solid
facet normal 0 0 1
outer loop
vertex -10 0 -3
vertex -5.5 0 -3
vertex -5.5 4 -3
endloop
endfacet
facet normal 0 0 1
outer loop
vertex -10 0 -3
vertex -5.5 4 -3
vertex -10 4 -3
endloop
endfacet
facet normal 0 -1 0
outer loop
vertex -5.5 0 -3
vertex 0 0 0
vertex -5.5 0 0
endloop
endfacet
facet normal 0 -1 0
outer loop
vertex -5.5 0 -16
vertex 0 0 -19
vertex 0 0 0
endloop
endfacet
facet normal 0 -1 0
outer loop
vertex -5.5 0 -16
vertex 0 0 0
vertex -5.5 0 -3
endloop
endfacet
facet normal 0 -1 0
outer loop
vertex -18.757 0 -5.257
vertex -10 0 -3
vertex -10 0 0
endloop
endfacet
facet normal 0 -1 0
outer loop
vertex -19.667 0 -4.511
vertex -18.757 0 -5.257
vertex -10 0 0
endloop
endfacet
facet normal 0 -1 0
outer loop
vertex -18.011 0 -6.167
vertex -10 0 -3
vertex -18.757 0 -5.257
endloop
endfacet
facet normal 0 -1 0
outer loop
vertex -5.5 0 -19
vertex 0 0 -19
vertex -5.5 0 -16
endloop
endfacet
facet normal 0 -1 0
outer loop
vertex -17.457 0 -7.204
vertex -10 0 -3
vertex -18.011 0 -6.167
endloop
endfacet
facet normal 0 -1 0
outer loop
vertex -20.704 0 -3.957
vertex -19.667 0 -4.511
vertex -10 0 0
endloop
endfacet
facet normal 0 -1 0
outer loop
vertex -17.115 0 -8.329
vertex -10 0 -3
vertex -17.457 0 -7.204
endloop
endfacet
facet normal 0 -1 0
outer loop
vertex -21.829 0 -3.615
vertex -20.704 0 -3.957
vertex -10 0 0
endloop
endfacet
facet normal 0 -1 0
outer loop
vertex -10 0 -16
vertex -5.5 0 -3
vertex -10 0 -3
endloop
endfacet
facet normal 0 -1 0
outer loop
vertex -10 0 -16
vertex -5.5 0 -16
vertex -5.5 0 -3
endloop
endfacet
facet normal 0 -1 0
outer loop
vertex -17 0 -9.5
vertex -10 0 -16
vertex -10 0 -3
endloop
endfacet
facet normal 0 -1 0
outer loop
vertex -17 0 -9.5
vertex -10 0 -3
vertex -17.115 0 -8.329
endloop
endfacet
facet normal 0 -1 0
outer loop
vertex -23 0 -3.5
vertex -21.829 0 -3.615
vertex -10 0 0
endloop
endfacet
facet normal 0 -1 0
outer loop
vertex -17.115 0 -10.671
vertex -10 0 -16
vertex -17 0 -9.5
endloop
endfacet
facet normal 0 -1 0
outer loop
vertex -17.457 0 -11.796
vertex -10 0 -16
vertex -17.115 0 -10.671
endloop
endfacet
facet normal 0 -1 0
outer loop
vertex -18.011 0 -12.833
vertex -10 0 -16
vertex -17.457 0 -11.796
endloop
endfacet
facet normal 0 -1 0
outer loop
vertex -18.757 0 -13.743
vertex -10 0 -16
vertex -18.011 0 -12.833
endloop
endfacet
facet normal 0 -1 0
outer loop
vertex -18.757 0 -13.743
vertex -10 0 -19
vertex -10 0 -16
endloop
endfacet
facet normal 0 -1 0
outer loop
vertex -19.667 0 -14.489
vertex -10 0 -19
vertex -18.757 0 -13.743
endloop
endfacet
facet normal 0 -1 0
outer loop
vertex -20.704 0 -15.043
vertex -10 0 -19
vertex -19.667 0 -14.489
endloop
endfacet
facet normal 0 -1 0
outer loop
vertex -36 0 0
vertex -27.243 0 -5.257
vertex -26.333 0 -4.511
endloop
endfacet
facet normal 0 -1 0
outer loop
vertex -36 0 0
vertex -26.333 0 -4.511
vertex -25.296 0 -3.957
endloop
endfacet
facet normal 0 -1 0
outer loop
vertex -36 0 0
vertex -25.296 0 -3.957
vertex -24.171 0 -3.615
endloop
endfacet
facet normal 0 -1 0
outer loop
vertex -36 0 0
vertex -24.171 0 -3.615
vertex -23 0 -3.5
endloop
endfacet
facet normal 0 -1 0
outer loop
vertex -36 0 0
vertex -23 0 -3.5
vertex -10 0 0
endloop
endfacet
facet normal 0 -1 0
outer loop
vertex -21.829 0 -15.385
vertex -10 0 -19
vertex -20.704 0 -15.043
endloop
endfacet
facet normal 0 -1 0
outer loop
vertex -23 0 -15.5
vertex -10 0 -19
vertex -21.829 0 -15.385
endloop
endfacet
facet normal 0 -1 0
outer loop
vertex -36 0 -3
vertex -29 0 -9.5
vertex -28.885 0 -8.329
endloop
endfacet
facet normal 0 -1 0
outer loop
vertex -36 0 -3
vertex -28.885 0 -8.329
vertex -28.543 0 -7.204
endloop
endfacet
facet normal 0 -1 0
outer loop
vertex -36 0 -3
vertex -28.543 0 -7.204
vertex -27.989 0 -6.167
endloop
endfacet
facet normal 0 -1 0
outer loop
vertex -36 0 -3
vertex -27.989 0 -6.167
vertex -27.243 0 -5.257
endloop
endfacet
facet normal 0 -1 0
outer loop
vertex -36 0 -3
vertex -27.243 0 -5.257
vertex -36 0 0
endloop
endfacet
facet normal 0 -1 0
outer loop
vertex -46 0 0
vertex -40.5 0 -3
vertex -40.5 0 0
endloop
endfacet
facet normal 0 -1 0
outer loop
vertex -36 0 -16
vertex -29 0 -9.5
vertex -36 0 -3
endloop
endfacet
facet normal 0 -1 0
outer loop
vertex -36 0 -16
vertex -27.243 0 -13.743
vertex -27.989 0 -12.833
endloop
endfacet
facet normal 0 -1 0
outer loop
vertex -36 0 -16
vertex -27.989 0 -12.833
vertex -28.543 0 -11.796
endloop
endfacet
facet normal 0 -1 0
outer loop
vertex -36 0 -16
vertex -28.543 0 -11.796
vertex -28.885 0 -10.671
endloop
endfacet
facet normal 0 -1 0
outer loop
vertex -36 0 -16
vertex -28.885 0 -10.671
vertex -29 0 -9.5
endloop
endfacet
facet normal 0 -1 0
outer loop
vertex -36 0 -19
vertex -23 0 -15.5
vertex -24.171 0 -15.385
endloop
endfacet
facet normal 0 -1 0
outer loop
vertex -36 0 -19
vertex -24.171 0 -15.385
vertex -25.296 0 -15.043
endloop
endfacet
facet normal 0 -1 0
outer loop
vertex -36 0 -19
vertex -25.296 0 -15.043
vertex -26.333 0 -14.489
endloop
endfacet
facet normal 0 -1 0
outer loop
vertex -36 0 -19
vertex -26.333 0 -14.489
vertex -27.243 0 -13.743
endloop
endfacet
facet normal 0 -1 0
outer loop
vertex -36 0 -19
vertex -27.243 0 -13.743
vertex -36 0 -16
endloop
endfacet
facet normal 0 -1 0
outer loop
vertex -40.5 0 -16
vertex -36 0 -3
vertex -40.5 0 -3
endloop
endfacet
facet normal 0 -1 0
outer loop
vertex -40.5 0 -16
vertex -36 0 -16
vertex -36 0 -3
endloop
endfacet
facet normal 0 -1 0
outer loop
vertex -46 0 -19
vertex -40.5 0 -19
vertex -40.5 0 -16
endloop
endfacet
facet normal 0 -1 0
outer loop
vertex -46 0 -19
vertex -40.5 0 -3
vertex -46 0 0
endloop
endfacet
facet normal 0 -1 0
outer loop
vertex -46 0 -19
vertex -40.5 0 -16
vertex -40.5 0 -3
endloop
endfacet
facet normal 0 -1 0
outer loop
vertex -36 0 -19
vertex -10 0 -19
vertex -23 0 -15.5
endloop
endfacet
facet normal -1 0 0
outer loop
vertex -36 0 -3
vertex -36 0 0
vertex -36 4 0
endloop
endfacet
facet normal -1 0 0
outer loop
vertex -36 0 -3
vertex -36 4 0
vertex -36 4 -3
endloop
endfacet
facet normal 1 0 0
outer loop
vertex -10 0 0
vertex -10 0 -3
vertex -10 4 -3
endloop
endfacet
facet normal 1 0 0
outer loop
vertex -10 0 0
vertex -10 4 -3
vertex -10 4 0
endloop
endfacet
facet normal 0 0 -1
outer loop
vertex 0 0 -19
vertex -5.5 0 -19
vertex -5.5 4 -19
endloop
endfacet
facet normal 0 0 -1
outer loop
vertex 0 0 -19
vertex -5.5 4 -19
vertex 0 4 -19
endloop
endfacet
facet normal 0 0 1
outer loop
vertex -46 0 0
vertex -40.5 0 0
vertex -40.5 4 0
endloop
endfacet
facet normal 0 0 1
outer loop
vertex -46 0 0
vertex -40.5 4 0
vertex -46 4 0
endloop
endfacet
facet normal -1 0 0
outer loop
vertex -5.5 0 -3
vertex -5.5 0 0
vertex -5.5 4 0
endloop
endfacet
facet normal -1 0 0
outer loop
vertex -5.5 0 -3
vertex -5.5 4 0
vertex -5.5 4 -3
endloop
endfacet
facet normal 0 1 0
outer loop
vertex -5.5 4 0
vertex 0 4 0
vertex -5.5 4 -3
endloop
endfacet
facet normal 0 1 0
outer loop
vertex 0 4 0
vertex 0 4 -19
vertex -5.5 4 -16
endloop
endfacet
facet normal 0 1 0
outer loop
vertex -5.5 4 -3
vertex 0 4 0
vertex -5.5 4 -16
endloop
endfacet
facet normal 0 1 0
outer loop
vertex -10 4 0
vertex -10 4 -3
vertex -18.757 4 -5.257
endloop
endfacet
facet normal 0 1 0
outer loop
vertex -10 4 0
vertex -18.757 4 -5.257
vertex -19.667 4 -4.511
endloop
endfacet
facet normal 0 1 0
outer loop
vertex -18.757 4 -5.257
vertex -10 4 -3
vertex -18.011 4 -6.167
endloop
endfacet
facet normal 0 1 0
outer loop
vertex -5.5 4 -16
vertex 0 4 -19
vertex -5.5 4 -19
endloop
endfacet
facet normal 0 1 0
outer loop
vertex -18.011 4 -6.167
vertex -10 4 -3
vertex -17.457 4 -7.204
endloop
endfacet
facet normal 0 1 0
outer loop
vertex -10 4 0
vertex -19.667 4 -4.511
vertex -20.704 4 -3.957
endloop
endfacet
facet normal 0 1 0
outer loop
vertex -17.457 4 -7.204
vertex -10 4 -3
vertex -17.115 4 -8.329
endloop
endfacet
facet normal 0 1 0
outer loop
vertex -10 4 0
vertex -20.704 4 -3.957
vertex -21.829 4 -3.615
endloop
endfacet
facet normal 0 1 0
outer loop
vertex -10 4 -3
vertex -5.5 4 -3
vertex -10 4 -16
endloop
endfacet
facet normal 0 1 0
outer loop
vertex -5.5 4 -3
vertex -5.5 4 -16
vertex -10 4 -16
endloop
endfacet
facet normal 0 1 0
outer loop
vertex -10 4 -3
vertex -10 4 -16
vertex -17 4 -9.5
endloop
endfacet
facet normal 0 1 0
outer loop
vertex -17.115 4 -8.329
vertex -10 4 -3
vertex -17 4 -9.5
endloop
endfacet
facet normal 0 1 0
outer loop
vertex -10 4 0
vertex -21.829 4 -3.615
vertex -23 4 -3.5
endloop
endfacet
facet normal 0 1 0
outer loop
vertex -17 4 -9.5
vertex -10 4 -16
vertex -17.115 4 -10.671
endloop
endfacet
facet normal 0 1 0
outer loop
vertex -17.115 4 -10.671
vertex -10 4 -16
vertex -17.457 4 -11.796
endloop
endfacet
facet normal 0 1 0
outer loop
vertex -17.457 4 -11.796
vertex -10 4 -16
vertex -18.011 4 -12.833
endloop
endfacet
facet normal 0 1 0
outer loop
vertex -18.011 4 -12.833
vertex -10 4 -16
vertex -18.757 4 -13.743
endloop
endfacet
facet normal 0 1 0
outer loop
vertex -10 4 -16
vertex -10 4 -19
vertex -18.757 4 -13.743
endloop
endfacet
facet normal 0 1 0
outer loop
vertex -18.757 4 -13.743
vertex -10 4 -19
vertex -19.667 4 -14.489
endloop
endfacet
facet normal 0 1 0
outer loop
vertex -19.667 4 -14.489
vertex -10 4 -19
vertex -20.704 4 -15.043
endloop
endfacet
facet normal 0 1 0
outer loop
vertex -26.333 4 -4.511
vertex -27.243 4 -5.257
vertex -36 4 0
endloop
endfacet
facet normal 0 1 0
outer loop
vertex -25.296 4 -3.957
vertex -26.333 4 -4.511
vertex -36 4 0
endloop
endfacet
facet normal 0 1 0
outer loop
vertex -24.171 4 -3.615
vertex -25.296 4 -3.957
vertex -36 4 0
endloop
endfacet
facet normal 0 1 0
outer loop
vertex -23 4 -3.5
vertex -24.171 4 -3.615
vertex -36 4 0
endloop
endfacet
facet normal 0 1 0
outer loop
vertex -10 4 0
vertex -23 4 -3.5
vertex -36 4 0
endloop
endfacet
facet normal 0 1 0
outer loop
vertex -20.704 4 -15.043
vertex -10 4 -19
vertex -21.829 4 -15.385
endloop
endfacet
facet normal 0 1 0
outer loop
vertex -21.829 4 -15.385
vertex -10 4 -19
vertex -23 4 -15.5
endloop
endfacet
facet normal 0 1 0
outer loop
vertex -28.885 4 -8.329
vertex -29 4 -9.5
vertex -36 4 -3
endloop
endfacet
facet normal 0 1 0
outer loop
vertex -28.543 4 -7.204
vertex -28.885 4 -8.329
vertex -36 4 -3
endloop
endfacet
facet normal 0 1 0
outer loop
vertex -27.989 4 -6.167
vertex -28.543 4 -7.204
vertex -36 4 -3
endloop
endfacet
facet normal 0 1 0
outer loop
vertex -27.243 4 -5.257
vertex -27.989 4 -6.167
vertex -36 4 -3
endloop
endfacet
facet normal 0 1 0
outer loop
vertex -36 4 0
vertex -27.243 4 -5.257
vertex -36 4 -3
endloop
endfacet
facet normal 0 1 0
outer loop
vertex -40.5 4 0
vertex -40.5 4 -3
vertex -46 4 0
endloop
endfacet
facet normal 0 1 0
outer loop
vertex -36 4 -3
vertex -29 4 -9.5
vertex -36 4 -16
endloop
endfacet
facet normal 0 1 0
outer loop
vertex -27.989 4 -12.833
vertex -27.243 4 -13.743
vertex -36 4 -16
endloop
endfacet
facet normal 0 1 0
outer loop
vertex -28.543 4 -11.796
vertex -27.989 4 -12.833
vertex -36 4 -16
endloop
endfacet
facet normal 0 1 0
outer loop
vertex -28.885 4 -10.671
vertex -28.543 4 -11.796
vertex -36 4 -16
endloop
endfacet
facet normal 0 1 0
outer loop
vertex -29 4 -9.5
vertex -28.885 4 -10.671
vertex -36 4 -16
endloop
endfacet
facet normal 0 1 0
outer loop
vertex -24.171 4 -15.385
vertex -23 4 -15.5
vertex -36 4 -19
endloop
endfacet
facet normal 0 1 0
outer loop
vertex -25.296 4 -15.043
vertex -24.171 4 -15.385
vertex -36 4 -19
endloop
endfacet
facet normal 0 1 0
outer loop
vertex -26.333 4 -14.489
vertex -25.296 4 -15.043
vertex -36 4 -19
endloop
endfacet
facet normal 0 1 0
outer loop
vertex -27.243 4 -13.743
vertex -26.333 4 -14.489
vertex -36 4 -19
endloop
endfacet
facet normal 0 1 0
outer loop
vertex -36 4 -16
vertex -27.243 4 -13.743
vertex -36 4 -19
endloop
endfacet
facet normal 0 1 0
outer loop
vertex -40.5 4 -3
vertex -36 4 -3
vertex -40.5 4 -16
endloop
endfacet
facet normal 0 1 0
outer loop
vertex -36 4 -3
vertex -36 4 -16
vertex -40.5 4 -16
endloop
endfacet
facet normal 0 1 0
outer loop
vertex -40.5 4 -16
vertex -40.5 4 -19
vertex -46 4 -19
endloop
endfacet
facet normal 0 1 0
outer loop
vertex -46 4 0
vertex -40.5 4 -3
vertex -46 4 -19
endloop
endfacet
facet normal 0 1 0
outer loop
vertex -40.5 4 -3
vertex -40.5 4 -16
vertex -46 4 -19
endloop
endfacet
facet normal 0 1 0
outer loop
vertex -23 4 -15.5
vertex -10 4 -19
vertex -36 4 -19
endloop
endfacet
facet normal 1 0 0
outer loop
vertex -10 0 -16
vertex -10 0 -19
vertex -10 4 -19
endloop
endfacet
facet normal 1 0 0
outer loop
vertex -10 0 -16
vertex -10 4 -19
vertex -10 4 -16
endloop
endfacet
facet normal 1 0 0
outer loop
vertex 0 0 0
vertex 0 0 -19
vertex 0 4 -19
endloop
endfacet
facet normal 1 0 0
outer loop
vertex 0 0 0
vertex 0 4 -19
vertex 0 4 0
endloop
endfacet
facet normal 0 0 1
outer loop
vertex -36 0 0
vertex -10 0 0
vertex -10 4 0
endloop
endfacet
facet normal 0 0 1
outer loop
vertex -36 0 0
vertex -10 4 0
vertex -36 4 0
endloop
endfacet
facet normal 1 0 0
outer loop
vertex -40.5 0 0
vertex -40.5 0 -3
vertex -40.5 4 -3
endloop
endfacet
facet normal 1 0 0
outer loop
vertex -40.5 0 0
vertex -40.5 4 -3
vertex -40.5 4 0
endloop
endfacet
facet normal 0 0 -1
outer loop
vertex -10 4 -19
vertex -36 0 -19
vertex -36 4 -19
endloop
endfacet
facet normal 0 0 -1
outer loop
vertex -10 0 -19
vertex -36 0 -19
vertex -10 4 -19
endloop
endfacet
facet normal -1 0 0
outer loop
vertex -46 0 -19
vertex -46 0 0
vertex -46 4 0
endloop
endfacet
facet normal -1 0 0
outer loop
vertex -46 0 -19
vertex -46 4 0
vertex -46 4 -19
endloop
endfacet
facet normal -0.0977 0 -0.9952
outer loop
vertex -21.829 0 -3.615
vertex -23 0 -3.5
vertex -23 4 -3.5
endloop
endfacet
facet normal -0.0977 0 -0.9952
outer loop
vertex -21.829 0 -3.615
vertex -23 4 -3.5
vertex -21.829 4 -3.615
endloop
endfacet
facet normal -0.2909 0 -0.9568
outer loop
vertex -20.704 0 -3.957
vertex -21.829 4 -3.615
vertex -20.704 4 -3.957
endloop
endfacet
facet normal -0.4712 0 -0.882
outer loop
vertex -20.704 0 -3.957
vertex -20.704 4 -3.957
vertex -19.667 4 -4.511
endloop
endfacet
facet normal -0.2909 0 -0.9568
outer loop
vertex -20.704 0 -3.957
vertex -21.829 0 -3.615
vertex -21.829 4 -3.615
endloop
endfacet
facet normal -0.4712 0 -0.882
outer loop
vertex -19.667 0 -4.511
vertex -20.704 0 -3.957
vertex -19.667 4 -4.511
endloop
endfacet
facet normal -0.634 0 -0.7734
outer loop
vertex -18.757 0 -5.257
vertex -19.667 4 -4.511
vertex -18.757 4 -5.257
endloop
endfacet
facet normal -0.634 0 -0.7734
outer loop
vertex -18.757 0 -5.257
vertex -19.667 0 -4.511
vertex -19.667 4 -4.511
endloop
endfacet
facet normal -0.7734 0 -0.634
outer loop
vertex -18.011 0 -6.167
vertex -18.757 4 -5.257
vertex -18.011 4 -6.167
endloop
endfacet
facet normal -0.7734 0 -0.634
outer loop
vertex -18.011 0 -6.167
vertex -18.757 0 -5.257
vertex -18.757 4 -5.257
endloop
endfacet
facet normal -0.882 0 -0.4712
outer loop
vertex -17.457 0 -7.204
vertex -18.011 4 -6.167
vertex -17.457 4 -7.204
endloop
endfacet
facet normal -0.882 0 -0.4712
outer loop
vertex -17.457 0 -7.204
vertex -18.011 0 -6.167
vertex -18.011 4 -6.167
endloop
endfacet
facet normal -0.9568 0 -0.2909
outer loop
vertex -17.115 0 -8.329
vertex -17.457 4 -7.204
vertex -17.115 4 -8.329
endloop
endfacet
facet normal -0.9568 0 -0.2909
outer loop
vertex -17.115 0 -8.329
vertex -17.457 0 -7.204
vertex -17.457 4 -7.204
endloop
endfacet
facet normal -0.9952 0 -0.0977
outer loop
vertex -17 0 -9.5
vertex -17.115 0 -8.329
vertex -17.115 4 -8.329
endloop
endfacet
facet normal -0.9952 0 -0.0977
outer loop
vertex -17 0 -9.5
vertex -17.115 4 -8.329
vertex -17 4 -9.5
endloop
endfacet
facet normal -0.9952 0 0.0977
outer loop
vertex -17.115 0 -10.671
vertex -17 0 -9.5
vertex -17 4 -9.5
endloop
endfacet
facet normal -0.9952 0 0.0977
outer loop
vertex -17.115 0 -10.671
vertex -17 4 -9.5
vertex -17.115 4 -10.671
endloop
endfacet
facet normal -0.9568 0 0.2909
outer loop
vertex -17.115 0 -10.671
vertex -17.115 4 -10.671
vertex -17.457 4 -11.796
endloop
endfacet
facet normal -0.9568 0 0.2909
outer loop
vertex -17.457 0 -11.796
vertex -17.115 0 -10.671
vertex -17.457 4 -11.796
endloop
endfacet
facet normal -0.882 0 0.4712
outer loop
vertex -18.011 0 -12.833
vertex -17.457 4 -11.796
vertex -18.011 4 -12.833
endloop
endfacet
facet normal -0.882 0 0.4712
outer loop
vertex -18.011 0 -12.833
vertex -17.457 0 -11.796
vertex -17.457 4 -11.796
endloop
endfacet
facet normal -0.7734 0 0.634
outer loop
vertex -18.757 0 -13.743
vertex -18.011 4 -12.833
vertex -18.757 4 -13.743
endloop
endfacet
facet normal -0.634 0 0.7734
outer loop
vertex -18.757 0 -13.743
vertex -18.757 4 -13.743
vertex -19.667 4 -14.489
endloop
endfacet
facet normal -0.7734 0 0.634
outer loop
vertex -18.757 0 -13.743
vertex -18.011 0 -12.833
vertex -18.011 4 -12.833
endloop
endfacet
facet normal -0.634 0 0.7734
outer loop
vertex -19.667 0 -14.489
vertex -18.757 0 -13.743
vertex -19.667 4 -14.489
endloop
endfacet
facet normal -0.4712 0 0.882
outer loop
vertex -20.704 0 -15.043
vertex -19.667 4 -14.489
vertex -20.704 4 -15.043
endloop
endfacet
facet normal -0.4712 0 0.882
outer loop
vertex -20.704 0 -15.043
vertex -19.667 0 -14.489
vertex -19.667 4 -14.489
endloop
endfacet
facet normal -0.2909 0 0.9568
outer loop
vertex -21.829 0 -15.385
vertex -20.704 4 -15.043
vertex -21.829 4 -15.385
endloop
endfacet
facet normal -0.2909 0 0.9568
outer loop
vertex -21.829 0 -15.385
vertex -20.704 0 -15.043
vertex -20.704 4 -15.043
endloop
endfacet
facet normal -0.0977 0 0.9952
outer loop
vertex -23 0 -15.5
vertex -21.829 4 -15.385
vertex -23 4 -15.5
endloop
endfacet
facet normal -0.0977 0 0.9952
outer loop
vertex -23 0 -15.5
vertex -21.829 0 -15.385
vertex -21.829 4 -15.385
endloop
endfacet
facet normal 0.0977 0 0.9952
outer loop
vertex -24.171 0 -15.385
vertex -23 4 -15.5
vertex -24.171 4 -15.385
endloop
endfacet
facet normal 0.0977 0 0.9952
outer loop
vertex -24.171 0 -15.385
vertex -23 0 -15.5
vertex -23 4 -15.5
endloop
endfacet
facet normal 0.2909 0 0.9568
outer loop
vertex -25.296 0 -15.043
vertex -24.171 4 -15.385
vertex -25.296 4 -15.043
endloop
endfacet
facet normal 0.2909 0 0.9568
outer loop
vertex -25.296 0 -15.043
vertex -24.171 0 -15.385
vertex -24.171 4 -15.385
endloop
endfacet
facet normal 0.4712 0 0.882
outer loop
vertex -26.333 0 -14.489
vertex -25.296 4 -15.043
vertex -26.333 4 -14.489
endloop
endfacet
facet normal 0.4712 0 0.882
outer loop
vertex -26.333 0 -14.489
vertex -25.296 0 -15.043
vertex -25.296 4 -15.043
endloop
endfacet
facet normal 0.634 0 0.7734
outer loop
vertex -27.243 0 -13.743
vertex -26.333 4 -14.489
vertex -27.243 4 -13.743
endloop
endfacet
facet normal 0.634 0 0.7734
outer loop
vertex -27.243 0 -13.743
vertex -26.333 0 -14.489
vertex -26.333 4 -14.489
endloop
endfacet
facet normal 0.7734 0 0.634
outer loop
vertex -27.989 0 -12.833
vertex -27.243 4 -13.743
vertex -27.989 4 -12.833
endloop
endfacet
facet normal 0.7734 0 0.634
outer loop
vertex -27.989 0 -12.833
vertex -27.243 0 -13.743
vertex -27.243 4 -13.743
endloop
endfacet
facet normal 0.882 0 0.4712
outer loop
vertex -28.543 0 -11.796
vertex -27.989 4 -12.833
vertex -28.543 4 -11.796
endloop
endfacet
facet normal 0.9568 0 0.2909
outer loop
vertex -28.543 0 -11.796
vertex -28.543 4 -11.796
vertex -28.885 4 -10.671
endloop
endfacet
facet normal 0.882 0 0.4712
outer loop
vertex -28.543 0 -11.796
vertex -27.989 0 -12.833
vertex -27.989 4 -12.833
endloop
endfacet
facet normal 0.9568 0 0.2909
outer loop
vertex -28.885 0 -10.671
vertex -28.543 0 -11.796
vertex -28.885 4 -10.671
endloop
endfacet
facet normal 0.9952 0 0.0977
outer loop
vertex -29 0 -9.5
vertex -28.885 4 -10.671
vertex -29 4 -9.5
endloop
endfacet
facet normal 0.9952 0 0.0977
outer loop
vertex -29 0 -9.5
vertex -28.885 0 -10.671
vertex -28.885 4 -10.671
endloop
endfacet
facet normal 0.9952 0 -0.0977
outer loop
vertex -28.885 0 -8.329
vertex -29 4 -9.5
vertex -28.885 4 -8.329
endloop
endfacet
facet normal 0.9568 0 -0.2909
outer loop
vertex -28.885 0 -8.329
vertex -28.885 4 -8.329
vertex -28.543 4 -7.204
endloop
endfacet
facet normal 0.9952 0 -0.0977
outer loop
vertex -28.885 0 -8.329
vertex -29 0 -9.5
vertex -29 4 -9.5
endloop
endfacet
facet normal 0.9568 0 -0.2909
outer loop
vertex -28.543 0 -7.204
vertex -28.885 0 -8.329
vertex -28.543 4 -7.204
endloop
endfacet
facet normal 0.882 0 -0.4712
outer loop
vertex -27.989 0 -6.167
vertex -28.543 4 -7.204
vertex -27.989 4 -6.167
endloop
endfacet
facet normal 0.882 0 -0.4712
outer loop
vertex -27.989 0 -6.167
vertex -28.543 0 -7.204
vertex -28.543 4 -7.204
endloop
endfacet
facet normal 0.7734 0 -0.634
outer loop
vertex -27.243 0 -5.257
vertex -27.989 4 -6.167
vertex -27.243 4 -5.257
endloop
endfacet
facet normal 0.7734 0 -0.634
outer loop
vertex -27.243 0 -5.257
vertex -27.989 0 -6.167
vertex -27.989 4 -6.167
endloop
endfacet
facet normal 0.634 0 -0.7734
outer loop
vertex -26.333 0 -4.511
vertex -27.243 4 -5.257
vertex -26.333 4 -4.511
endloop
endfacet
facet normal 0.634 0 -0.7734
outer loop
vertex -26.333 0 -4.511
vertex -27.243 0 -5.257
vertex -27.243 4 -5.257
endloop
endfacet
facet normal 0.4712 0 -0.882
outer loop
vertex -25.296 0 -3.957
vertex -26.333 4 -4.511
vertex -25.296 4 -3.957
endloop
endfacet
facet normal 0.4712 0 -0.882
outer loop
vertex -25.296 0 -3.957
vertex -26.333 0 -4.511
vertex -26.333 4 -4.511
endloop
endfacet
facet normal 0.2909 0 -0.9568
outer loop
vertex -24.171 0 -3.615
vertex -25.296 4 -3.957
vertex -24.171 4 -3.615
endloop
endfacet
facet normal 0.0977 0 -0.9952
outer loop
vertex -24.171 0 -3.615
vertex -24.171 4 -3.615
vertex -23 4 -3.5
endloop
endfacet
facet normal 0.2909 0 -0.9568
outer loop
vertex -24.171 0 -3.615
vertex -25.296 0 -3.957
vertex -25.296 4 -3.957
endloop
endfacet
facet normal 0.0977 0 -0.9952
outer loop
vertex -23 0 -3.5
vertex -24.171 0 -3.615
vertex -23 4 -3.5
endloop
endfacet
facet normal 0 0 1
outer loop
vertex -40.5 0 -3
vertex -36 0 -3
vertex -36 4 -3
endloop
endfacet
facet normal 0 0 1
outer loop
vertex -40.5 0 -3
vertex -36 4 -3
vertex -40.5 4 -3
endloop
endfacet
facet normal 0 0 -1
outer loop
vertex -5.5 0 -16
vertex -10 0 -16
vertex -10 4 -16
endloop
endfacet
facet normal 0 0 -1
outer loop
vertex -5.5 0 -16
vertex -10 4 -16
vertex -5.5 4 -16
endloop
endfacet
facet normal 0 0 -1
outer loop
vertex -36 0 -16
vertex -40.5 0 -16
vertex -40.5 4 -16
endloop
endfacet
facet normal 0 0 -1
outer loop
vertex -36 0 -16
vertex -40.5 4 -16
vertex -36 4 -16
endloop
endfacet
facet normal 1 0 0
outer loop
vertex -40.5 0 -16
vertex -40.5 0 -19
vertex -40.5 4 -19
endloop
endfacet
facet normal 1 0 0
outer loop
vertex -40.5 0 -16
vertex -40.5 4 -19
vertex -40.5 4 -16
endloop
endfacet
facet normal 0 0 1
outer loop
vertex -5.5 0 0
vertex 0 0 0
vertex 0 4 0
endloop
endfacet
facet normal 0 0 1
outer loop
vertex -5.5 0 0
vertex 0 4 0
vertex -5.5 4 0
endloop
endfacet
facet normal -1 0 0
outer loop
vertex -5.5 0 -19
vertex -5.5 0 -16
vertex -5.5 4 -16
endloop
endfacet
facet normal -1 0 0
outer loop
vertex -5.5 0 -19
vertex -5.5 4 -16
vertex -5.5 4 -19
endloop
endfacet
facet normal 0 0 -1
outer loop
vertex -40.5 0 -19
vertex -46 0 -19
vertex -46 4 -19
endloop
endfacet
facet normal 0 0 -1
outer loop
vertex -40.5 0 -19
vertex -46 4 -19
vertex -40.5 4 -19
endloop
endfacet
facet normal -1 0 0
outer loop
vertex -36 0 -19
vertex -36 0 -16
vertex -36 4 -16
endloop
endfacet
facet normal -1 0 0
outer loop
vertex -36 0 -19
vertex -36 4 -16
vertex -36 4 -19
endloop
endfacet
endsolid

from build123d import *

# Parameters (mm, degrees)
SKETCH_1_R      = 6
EXTRUDE_1_DEPTH = 4


with BuildPart() as part:
    # ｽｹｯﾁ1 → ﾎﾞｽ - 押し出し1 (new body)
    with BuildSketch(Plane(origin=(0, 0, 0), x_dir=(1, 0, 0), z_dir=(0, 1, 0))):
        Polygon((0, 0), (-5.5, 0), (-5.5, 3), (-10, 3), (-10, 0), (-36, 0), (-36, 3), (-40.5, 3), (-40.5, 0), (-46, 0), (-46, 19), (-40.5, 19), (-40.5, 16), (-36, 16), (-36, 19), (-10, 19), (-10, 16), (-5.5, 16), (-5.5, 19), (0, 19), align=None)
        with Locations(Location((-23, 9.5, 0), (0, 0, 270))):
            Circle(SKETCH_1_R, mode=Mode.SUBTRACT)
    extrude(amount=EXTRUDE_1_DEPTH)


solid = part.part
